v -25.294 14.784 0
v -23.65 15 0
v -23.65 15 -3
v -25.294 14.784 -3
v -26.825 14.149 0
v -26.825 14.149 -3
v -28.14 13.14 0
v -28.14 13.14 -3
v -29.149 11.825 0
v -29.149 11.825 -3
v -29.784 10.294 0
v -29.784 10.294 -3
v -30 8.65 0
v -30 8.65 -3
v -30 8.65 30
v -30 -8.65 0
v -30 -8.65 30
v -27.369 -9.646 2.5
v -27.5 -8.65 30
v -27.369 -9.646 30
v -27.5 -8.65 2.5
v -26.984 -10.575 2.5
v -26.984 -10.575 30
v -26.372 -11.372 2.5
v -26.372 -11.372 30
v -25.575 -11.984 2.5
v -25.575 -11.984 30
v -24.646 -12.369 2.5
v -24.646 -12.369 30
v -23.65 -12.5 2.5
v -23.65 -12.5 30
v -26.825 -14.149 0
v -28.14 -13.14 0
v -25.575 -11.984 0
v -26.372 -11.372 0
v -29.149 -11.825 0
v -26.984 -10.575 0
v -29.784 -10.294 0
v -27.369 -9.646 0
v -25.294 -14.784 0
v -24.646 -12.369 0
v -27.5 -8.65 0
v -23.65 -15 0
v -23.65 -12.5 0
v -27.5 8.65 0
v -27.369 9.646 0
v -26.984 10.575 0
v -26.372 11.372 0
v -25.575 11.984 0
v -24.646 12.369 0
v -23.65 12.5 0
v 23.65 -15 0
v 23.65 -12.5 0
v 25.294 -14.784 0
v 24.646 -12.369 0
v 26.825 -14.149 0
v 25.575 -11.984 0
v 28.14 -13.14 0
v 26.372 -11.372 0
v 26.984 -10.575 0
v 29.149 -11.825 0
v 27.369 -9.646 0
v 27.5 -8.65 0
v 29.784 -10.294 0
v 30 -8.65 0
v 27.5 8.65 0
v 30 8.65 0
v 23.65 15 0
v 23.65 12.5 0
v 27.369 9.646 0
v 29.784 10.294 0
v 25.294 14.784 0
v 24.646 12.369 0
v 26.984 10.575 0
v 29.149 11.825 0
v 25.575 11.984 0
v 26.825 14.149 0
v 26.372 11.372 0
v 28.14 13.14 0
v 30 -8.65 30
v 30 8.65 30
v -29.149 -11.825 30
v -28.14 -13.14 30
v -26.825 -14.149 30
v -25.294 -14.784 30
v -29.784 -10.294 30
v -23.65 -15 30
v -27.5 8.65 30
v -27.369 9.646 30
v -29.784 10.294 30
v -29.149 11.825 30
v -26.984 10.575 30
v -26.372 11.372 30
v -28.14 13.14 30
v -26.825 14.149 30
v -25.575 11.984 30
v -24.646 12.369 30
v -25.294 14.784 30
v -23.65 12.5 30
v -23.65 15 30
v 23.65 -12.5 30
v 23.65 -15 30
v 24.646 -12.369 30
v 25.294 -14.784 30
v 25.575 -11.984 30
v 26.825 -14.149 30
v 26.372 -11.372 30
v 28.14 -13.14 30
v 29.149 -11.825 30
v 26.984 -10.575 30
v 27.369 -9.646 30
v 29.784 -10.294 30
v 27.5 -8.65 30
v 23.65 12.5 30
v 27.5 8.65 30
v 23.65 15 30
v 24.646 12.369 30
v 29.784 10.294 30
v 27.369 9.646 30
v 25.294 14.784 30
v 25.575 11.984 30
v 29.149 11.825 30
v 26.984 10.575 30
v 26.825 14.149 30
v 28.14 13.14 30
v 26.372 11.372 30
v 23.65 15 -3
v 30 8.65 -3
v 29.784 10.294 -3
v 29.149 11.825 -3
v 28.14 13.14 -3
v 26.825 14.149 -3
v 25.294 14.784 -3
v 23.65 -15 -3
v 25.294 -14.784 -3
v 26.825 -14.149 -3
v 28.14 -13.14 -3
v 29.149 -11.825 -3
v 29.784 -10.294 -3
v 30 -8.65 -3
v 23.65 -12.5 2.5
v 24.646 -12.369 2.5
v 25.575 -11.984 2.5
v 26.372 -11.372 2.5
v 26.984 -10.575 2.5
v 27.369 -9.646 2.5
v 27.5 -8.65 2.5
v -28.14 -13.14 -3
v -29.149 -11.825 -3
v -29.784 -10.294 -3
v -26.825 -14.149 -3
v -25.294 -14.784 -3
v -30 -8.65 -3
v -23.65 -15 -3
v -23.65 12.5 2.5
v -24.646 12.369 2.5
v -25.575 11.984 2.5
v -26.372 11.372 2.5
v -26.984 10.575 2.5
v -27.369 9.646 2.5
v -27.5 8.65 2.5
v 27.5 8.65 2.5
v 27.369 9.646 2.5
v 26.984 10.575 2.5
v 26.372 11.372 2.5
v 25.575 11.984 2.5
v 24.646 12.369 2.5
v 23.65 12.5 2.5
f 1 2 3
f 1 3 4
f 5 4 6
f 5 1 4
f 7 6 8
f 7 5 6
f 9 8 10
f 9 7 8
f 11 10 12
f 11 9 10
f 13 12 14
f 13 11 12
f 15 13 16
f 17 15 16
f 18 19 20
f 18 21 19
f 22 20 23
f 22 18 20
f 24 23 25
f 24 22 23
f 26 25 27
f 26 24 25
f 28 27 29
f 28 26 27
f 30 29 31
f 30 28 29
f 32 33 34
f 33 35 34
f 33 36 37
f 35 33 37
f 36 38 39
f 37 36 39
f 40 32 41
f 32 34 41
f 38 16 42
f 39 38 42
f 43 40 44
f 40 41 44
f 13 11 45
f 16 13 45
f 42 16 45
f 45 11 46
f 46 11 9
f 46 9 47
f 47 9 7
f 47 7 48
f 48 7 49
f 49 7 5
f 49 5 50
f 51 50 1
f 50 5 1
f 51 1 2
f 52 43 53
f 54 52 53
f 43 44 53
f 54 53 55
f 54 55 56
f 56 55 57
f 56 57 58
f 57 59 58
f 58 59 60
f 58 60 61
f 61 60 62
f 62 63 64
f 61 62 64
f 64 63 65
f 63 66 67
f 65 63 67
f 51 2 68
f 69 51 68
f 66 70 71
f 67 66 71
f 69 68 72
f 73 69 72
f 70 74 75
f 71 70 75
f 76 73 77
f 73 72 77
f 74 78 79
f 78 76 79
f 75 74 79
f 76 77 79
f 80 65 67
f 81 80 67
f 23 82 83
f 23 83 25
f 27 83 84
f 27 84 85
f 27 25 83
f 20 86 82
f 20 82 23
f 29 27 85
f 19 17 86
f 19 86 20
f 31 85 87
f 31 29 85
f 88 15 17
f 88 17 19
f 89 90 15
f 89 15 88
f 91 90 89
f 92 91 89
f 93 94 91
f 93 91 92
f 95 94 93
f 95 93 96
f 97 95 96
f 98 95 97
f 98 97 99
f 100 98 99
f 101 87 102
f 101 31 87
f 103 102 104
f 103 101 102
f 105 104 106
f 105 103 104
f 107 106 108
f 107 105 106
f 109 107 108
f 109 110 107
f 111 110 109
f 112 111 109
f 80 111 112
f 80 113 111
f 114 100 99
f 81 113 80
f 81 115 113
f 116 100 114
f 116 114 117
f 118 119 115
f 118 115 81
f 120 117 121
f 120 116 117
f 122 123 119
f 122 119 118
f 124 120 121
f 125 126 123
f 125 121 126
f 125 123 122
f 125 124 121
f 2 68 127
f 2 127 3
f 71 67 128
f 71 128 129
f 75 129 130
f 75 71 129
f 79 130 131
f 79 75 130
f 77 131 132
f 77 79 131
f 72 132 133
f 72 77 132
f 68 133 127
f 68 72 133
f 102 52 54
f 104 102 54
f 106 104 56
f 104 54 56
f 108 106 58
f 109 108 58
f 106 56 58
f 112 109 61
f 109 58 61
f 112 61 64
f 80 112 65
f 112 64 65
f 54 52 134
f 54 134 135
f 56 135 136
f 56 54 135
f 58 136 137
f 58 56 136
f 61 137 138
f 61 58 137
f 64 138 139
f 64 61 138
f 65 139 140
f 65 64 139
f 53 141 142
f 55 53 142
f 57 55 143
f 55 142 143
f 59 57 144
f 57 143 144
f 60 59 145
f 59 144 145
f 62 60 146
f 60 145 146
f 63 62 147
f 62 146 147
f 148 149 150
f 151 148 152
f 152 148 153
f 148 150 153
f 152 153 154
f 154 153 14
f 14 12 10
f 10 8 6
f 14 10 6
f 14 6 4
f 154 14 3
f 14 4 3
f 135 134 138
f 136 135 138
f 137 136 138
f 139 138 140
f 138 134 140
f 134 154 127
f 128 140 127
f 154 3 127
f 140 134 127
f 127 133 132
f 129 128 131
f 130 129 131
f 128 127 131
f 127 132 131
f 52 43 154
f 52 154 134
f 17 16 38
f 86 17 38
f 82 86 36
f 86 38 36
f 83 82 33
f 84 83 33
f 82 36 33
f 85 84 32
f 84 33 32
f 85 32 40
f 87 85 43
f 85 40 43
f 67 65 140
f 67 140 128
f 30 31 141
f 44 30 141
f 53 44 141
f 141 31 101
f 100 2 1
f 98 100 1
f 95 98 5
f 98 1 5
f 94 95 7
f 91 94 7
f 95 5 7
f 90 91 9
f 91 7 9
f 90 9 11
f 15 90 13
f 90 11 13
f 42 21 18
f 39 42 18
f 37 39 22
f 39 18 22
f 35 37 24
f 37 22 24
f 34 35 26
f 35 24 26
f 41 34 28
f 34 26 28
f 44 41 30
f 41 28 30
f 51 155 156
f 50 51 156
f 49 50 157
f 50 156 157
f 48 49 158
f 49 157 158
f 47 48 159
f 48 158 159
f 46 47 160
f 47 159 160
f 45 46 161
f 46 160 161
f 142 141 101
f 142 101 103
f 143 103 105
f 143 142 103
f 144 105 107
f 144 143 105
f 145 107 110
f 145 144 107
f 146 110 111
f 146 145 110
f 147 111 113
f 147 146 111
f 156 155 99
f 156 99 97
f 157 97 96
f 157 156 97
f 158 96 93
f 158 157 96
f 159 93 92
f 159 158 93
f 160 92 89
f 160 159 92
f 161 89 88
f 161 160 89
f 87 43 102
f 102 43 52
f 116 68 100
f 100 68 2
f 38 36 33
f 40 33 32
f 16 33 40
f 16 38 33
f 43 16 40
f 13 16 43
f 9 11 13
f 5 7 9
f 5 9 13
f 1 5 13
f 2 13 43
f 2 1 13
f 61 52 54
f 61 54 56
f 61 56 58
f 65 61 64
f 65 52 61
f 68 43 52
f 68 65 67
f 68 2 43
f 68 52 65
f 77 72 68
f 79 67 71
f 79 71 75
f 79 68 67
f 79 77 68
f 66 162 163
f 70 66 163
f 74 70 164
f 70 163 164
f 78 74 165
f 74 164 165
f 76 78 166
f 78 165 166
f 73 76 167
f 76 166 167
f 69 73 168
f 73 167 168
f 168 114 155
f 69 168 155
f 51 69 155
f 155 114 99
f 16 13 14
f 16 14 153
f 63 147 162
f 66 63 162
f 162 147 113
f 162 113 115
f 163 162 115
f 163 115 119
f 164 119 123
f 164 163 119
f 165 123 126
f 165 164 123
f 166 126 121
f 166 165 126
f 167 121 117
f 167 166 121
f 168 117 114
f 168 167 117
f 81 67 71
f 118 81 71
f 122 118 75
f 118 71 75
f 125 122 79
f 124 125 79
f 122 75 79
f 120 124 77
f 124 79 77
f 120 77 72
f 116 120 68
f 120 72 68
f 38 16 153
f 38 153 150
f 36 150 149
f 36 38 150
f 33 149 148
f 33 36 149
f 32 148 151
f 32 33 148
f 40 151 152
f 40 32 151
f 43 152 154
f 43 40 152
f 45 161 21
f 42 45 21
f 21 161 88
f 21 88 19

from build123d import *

# Parameters (mm, degrees)
F1_DEPTH = 30
F2_T     = -2.5
F4_DEPTH = 2.501
F5_DEPTH = 3


with BuildPart() as f1:
    # F0 (on Top) → F1 (new body)
    with BuildSketch(Plane.XY):
        with BuildLine():
            Line((-23.65, -15), (23.65, -15))
            ThreePointArc((23.65, -15), (28.140128, -13.140128), (30, -8.65))
            Line((30, -8.65), (30, 8.65))
            ThreePointArc((30, 8.65), (28.140128, 13.140128), (23.65, 15))
            Line((23.65, 15), (-23.65, 15))
            ThreePointArc((-23.65, 15), (-28.140128, 13.140128), (-30, 8.65))
            Line((-30, 8.65), (-30, -8.65))
            ThreePointArc((-30, -8.65), (-28.140128, -13.140128), (-23.65, -15))
        make_face()
    extrude(amount=F1_DEPTH)

    # F2
    f2_openings = [f1.faces().sort_by_distance(p)[0] for p in [
        (0, 0, 30),
    ]]
    offset(amount=F2_T, openings=f2_openings)

    # F3 (on face) → F4 (cut, through all)
    with BuildSketch(Plane.XY.offset(2.5)):
        with BuildLine():
            Line((27.5, -8.65), (27.5, 8.65))
            ThreePointArc((27.5, 8.65), (26.372361, 11.372361), (23.65, 12.5))
            Line((23.65, 12.5), (-23.65, 12.5))
            ThreePointArc((-23.65, 12.5), (-26.372361, 11.372361), (-27.5, 8.65))
            Line((-27.5, 8.65), (-27.5, -8.65))
            ThreePointArc((-27.5, -8.65), (-26.372361, -11.372361), (-23.65, -12.5))
            Line((-23.65, -12.5), (23.65, -12.5))
            ThreePointArc((23.65, -12.5), (26.372361, -11.372361), (27.5, -8.65))
        make_face()
    extrude(amount=-F4_DEPTH, mode=Mode.SUBTRACT)


with BuildPart() as f5:
    # F0 (on Top) → F5 (new body)
    with BuildSketch(Plane.XY):
        with BuildLine():
            Line((-23.65, -15), (23.65, -15))
            ThreePointArc((23.65, -15), (28.140128, -13.140128), (30, -8.65))
            Line((30, -8.65), (30, 8.65))
            ThreePointArc((30, 8.65), (28.140128, 13.140128), (23.65, 15))
            Line((23.65, 15), (-23.65, 15))
            ThreePointArc((-23.65, 15), (-28.140128, 13.140128), (-30, 8.65))
            Line((-30, 8.65), (-30, -8.65))
            ThreePointArc((-30, -8.65), (-28.140128, -13.140128), (-23.65, -15))
        make_face()
    extrude(amount=-F5_DEPTH)


solid = Compound([f1.part, f5.part])
